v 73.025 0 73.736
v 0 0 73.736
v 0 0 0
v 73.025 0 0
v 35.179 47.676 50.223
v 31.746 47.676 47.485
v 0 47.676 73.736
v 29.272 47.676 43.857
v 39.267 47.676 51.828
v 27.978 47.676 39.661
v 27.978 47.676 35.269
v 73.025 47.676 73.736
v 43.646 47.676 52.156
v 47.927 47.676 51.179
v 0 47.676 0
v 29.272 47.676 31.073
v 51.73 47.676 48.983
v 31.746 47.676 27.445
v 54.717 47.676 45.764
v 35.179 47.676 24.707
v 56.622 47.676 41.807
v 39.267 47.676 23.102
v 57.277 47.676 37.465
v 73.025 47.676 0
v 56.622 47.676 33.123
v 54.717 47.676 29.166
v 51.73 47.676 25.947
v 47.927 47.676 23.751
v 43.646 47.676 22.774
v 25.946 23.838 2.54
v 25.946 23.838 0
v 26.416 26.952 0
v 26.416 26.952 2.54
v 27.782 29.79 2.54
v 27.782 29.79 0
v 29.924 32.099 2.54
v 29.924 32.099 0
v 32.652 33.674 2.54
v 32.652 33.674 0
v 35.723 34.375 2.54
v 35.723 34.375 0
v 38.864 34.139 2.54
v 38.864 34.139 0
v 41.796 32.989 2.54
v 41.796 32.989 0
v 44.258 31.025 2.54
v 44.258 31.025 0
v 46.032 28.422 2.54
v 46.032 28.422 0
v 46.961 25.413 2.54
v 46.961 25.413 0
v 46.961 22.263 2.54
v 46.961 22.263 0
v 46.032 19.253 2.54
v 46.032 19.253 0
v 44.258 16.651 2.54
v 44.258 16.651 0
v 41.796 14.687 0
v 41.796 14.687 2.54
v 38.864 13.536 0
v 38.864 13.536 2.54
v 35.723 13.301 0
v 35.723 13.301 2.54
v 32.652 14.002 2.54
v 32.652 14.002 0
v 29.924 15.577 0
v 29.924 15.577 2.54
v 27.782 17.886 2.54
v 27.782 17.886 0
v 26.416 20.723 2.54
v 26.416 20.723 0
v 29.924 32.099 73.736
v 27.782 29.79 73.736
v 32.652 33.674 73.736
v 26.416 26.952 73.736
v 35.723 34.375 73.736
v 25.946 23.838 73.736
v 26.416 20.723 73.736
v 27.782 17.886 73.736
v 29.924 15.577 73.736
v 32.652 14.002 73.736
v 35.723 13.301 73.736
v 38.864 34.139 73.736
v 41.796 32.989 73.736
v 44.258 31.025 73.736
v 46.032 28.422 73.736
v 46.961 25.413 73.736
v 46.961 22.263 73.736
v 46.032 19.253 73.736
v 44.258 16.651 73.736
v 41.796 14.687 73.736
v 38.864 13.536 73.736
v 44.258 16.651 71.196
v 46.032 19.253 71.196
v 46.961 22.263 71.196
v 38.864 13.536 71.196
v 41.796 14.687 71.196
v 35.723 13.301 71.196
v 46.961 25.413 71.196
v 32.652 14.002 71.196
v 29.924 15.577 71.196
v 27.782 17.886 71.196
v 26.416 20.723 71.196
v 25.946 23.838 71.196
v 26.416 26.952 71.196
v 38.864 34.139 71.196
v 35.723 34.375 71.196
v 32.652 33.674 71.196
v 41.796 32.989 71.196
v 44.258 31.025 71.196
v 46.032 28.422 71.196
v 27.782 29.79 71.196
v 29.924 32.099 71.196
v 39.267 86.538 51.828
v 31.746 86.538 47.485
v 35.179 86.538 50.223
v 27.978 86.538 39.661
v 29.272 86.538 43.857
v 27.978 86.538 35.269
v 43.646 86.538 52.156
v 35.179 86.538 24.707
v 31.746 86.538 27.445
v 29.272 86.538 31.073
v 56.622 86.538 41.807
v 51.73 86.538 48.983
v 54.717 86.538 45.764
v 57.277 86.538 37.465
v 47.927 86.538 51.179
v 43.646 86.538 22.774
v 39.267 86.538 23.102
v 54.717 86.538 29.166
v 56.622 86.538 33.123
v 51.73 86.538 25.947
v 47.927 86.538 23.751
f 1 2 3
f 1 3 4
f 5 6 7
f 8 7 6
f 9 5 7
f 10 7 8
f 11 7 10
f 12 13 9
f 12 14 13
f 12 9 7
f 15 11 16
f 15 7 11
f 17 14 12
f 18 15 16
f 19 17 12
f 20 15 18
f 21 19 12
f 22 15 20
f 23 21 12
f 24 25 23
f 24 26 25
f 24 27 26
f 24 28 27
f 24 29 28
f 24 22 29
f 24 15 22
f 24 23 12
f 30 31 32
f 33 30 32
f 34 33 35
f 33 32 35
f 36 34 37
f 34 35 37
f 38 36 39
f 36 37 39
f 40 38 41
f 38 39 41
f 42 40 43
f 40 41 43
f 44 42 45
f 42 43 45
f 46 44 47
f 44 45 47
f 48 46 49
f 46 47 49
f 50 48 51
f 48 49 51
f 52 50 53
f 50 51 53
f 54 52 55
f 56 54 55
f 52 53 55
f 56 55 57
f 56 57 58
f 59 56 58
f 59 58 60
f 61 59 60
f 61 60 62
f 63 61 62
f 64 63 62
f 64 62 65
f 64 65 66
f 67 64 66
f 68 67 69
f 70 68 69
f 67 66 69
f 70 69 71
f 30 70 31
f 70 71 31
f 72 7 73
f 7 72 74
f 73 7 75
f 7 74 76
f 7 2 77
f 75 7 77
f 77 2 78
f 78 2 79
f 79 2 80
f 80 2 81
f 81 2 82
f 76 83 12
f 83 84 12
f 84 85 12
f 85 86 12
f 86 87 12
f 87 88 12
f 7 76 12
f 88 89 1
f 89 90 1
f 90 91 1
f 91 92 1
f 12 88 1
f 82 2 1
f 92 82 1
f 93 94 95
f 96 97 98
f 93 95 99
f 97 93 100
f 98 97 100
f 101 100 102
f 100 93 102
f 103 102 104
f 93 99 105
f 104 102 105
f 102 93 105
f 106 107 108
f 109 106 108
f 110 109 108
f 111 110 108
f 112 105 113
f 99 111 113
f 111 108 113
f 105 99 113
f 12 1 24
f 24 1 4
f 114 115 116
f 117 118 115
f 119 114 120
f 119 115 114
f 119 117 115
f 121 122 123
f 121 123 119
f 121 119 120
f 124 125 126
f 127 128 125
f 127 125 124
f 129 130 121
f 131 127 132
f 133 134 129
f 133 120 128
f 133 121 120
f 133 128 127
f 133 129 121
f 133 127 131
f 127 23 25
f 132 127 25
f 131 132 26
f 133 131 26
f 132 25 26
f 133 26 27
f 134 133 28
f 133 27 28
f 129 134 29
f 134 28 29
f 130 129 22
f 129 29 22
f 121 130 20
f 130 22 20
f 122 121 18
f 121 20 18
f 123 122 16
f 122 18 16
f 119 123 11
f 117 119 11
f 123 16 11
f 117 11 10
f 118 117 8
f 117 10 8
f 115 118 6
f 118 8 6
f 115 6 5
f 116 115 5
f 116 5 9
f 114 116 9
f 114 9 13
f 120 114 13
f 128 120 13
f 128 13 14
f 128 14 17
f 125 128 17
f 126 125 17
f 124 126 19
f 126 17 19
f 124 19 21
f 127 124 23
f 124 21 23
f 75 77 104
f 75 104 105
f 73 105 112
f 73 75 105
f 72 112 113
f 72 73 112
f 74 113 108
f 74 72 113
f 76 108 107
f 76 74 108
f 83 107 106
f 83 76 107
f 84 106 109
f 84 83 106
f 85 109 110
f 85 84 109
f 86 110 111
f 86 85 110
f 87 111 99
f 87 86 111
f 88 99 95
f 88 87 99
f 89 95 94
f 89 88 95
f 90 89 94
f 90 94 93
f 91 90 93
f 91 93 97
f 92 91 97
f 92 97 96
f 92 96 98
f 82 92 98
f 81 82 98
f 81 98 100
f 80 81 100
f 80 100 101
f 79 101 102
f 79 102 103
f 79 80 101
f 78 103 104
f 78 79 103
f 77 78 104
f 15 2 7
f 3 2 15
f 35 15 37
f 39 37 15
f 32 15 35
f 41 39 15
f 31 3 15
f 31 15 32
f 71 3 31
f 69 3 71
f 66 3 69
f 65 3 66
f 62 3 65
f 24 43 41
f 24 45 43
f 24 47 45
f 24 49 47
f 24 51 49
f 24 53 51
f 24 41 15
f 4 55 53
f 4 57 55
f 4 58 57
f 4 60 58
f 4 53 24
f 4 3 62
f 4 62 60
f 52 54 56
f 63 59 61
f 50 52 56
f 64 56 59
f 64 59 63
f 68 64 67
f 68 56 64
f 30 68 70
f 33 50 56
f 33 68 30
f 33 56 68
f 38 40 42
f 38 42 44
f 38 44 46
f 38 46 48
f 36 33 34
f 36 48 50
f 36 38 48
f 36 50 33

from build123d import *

# Parameters (mm, degrees)
SKETCH1_W           = 73.025
SKETCH1_H           = 73.7362
BOSS_EXTRUDE1_DEPTH = 47.6758
SKETCH2_R           = 10.5664
CUT_EXTRUDE1_DEPTH  = 2.54
SKETCH3_R           = 14.732
BOSS_EXTRUDE2_DEPTH = 38.862


with BuildPart() as part:
    # Sketch1 → Boss-Extrude1 (new body)
    with BuildSketch(Plane(origin=(0, 0, 0), x_dir=(1, 0, 0), z_dir=(0, 1, 0))):
        with Locations((36.5125, -36.8681)):
            Rectangle(SKETCH1_W, SKETCH1_H)
    extrude(amount=BOSS_EXTRUDE1_DEPTH)

    # Sketch2 → Cut-Extrude1 (cut)
    with BuildSketch(Plane(origin=(0, 0, 0), x_dir=(-1, 0, 0), z_dir=(0, 0, -1))):
        with Locations((-36.5125, 23.8379)):
            Circle(SKETCH2_R)
    cut_extrude1 = extrude(amount=-CUT_EXTRUDE1_DEPTH, mode=Mode.SUBTRACT)

    # Sketch3 → Boss-Extrude2 (add)
    with BuildSketch(Plane(origin=(0, 47.6758, 0), x_dir=(1, 0, 0), z_dir=(0, 1, 0))):
        with Locations((42.545, -37.465)):
            Circle(SKETCH3_R)
    extrude(amount=BOSS_EXTRUDE2_DEPTH)

    # Mirror1: Cut-Extrude1 across plane
    add(cut_extrude1.mirror(Plane.XY.offset(36.8681)), mode=Mode.SUBTRACT)


solid = part.part
